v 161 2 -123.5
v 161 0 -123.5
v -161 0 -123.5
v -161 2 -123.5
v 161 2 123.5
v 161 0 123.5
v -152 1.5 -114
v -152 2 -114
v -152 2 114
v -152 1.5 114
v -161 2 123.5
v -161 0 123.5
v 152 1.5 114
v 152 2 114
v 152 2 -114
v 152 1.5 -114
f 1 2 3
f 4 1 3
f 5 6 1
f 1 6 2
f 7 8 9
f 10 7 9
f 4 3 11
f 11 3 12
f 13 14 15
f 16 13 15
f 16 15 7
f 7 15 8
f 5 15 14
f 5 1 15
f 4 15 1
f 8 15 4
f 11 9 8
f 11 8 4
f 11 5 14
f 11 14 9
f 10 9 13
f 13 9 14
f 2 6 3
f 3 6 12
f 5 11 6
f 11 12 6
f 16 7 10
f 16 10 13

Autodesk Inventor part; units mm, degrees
ref_plane "YZ Plane" through (0, 0, 0) normal (1, 0, 0) x (0, 1, 0)
ref_plane "XZ Plane" through (0, 0, 0) normal (0, 1, 0) x (-1, 0, 0)
ref_plane "XY Plane" through (0, 0, 0) normal (0, 0, 1) x (1, 0, 0)
sketch "Szkic1" plane through (0, 0, 0) normal (0, 1, 0) x (-1, 0, 0)
  line L0 (-161, -123.5) -> (161, -123.5)
  line L1 (161, -123.5) -> (161, 123.5)
  line L2 (161, 123.5) -> (-161, 123.5)
  line L3 (-161, 123.5) -> (-161, -123.5)
  line L4 (-161, -123.5) -> (161, 123.5) construction
  line L5 (161, -123.5) -> (-161, 123.5) construction
  point P0 (0, 0)
  dimension "d0" = 322
  dimension "d1" = 247
extrude "Wyciągnięcie proste1" add sketch "Szkic1" along normal blind 2
sketch "Szkic2" plane through (0, 2, 0) normal (0, 1, 0) x (1, 0, 0)
  line L0 (161, 123.5) -> (-161, 123.5) projected
  line L1 (-161, 123.5) -> (-161, -123.5) projected
  line L2 (-161, -123.5) -> (161, -123.5) projected
  line L3 (161, -123.5) -> (161, 123.5) projected
  line L4 (152, 114) -> (-152, 114)
  line L5 (-152, 114) -> (-152, -114)
  line L6 (-152, -114) -> (152, -114)
  line L7 (152, -114) -> (152, 114)
  line L8 (152, 114) -> (-152, -114) construction
  line L9 (-152, 114) -> (152, -114) construction
  point P0 (0, 0)
  dimension "d11" = 9
  dimension "d12" = 9
  dimension "d13" = 9.5
  dimension "d14" = 9.5
extrude "Wyciągnięcie proste3" cut sketch "Szkic2" against normal blind 0.5 contours L7 L6 L5 L4
equation "\"d14\" = d13"
properties part number "resistive_panel_12.1" material "Szkło"
